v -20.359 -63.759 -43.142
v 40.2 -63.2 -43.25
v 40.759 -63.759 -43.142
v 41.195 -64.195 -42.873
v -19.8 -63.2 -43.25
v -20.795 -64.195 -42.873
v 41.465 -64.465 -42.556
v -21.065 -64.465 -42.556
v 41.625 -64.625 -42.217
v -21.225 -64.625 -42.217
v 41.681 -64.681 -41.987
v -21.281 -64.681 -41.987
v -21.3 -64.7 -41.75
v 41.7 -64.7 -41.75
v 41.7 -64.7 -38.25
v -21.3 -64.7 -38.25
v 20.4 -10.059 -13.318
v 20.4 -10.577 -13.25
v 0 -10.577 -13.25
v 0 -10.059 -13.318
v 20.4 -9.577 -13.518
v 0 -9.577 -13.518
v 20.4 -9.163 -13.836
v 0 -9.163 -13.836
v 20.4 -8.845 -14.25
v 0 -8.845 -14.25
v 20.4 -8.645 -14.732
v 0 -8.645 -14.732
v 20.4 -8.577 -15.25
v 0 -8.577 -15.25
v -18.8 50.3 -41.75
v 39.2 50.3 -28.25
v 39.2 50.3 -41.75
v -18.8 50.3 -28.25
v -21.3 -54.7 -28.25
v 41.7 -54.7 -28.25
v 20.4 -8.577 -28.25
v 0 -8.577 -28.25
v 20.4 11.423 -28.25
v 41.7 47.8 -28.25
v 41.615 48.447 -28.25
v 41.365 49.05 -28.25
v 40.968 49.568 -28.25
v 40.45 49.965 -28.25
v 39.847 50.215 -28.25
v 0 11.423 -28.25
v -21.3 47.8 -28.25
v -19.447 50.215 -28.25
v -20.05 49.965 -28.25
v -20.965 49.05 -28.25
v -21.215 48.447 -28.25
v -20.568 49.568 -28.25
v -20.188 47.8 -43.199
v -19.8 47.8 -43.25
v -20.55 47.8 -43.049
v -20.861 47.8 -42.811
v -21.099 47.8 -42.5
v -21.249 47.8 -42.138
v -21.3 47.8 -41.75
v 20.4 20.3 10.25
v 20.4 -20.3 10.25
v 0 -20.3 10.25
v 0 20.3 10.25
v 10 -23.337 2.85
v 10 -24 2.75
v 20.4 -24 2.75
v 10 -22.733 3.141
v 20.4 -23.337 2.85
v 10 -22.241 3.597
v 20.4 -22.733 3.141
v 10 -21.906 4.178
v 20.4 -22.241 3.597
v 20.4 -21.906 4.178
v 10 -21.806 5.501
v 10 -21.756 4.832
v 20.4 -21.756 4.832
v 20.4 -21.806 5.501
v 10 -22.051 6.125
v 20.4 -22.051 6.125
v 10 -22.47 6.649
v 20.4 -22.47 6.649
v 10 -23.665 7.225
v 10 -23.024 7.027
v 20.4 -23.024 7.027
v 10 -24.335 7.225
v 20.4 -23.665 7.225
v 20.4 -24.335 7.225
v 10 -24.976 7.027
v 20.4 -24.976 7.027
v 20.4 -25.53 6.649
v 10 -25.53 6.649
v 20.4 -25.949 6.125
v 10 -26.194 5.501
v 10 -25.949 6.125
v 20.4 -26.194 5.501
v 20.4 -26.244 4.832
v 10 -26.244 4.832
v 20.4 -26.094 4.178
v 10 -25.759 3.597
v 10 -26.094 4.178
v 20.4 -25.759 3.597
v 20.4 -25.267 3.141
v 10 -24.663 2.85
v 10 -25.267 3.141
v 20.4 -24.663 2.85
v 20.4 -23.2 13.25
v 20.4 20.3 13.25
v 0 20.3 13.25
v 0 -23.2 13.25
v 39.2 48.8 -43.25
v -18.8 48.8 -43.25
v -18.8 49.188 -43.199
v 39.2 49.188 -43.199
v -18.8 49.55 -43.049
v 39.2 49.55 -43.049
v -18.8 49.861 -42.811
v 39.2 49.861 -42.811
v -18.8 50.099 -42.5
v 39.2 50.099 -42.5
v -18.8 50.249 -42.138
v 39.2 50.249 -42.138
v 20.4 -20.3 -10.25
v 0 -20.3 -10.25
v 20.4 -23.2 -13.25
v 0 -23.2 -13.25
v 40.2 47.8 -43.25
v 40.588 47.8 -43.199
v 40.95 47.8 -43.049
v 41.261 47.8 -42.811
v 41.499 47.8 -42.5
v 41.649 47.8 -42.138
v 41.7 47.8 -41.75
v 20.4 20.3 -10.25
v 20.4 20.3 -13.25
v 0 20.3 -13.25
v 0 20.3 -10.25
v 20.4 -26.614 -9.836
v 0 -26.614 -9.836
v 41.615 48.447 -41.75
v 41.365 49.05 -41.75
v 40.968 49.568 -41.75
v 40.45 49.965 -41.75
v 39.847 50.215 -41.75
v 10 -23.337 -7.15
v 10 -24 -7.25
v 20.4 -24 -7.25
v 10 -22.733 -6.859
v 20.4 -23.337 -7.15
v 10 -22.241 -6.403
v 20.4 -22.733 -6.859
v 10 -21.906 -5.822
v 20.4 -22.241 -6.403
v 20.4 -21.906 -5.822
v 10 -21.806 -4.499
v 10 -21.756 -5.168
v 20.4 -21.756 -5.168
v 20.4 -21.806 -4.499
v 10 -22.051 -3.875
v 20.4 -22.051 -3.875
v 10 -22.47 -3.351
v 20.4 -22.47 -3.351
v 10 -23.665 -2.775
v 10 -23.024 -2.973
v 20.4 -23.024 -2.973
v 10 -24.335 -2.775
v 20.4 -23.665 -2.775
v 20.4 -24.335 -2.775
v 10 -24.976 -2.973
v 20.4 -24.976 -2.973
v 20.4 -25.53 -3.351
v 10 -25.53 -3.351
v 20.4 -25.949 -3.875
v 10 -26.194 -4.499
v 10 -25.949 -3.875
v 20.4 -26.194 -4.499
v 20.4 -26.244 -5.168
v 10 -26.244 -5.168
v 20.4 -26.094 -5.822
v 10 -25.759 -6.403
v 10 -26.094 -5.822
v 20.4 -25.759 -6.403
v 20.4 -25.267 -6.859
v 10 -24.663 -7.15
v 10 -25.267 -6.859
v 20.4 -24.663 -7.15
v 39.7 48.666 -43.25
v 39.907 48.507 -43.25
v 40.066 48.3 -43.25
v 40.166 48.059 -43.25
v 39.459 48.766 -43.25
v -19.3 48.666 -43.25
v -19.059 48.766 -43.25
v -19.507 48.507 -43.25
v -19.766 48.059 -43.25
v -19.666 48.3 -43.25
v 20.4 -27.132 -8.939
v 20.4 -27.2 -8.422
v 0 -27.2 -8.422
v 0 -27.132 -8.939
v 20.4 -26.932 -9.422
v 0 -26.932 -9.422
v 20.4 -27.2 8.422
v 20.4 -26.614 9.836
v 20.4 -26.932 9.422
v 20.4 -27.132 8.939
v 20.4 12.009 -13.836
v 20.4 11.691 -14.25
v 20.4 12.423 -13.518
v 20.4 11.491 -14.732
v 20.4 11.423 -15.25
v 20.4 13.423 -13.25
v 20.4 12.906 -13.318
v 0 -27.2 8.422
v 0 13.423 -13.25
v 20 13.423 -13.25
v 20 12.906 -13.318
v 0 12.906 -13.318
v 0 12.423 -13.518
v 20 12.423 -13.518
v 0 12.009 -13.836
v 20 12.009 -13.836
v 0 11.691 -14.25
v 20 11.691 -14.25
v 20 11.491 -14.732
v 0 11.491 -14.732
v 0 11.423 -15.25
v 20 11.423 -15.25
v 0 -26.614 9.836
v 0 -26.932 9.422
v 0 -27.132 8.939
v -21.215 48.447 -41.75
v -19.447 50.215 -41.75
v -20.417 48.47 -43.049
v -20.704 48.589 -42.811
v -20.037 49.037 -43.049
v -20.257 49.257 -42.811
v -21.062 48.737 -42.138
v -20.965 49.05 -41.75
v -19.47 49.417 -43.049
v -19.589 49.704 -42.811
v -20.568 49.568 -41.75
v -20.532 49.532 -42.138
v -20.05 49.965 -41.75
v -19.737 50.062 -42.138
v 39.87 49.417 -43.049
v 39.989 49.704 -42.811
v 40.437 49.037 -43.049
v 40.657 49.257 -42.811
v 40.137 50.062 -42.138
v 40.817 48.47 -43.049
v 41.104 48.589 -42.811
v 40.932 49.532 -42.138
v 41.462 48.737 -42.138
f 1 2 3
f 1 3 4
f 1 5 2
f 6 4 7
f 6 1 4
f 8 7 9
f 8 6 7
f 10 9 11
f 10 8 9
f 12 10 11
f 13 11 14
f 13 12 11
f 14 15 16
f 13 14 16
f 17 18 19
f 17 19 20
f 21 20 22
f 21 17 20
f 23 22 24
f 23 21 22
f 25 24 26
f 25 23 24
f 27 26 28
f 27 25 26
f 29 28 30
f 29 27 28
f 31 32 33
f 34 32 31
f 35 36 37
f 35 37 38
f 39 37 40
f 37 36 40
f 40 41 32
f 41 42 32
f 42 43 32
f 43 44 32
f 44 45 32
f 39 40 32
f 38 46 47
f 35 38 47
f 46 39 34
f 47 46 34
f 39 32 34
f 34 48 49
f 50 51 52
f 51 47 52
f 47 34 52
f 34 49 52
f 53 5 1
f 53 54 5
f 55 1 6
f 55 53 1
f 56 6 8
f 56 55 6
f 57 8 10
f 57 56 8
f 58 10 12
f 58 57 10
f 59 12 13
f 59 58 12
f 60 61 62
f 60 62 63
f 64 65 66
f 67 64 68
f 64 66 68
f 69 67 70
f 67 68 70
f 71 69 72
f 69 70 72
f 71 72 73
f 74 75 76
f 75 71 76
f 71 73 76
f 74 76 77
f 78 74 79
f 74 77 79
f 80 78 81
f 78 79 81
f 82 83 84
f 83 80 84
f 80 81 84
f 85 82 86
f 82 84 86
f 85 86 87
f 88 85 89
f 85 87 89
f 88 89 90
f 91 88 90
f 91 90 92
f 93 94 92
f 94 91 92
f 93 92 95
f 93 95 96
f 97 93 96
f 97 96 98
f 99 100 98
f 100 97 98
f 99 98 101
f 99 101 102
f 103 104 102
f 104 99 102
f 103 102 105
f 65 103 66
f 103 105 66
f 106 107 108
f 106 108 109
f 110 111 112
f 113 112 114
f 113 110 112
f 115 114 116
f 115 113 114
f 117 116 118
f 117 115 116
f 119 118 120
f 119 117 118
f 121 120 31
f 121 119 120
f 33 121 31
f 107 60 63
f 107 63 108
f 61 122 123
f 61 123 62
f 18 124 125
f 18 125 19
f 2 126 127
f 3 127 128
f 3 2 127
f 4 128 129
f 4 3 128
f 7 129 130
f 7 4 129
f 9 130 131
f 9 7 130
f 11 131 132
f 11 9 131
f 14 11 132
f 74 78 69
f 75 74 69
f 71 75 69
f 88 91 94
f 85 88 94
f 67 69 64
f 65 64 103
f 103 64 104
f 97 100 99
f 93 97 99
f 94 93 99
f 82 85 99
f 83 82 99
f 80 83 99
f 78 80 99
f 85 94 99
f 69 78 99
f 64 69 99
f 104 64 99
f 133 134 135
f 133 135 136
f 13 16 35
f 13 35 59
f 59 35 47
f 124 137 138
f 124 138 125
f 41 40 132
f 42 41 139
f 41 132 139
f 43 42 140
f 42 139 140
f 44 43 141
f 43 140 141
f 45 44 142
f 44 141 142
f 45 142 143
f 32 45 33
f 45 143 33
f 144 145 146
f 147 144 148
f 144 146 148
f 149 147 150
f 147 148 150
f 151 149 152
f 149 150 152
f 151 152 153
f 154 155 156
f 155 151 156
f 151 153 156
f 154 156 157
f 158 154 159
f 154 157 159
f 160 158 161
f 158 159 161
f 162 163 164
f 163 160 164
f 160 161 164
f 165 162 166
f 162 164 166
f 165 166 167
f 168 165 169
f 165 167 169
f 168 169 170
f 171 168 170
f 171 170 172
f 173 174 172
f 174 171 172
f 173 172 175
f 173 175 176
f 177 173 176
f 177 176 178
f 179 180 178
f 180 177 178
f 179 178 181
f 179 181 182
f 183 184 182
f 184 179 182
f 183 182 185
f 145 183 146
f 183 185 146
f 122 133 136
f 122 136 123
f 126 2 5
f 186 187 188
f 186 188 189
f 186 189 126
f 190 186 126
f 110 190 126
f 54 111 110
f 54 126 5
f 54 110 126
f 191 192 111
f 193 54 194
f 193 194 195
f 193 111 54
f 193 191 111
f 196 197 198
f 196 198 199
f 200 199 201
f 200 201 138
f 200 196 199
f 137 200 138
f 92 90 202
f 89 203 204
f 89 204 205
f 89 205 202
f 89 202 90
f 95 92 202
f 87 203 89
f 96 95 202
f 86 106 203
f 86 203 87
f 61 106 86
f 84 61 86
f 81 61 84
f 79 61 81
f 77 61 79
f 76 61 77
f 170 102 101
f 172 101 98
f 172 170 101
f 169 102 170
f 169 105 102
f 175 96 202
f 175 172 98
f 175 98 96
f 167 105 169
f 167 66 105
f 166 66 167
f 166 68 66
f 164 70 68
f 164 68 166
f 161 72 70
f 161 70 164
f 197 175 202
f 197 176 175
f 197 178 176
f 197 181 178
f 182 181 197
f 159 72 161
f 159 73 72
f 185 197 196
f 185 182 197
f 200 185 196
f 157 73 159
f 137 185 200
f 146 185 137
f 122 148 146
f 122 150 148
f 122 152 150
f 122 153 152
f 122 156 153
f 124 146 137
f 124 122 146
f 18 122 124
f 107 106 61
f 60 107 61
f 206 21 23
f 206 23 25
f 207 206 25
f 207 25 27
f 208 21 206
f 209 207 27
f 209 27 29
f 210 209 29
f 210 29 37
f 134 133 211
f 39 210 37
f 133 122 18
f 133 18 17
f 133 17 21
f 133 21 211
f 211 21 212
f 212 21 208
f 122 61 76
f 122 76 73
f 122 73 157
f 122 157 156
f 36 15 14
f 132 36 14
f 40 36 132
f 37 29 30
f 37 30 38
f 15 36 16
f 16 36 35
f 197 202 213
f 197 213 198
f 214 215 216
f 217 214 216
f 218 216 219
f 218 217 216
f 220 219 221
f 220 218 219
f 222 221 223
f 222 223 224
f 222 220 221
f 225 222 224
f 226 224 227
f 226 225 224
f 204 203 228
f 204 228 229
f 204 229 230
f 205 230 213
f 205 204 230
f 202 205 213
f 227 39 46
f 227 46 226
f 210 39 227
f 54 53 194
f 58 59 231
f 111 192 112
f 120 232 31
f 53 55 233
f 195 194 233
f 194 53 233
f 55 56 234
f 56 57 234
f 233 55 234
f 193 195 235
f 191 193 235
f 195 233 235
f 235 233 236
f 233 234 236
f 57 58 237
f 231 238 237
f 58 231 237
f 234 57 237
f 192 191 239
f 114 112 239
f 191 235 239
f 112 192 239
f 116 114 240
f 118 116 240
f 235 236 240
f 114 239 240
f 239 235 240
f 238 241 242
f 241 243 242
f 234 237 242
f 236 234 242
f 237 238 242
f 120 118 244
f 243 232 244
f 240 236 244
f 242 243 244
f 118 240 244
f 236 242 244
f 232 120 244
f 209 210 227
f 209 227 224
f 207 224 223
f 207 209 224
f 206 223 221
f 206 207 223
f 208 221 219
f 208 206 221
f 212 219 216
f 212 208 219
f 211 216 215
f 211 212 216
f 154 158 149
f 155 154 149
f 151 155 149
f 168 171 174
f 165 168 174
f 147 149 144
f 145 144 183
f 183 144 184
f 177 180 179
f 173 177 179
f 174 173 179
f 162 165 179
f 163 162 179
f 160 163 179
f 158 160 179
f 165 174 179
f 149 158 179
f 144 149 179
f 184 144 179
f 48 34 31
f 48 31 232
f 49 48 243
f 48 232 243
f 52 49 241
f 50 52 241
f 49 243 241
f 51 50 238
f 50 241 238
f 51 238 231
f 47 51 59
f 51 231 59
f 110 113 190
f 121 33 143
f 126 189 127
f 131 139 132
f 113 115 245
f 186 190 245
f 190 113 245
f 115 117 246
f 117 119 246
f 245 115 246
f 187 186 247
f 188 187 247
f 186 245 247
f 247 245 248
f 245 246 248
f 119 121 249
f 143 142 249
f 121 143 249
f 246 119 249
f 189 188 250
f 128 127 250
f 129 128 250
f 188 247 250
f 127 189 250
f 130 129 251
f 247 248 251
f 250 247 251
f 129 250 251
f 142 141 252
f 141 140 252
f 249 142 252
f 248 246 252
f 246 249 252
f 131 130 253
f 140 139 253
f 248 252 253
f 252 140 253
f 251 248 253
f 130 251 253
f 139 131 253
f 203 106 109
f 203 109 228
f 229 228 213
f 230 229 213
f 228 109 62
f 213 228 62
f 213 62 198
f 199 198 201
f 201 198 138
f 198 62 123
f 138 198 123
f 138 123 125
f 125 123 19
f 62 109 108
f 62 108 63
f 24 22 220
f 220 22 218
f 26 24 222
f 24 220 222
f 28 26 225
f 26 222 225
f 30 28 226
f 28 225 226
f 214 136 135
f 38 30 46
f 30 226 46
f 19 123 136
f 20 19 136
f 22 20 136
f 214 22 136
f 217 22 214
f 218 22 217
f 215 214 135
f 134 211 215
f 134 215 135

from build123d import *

# Parameters (mm, degrees)
SKETCH1_R            = 2.25
BOSS_EXTRUDE1_DEPTH  = 20
SKETCH2_R            = 2.25
BOSS_EXTRUDE2_DEPTH  = 10
SKETCH4_W            = 26.5
SKETCH4_H            = 2.5
CUT_EXTRUDE1_DEPTH   = 39.17921555
CHAMFER2_SIZE        = 4
CHAMFER3_SIZE        = 4
FILLET4_R            = 2
SKETCH7_W            = 15
SKETCH7_H            = 20
BOSS_EXTRUDE5_DEPTH  = 20
FILLET6_R            = 2
SKETCH13_R           = 2.25
BOSS_EXTRUDE8_DEPTH  = 20
CUT_EXTRUDE2_DEPTH   = 45.021614009
BOSS_EXTRUDE9_START  = -10
SKETCH14_R           = 2.25
BOSS_EXTRUDE9_DEPTH  = 10
BOSS_EXTRUDE10_START = 0.4
SKETCH15_R           = 2.25
BOSS_EXTRUDE10_DEPTH = 0.4
SKETCH16_W           = 63
SKETCH16_H           = 115
BOSS_EXTRUDE11_DEPTH = 15
CHAMFER4_SIZE        = 10
FILLET7_R            = 2.5
FILLET8_R            = 1.5


with BuildPart() as part:
    # Sketch1 → Boss-Extrude1 (new body)
    with BuildSketch(Plane(origin=(0, 0, 0), x_dir=(0, 0, -1), z_dir=(1, 0, 0))):
        Polygon((10.25, -20.3), (13.25, -20.3), (13.25, 29.7), (-13.25, 29.7), (-13.25, -20.3), (-10.25, -20.3), (-10.25, 20.3), (10.25, 20.3), align=None)
        with Locations((5, 24)):
            Circle(SKETCH1_R, mode=Mode.SUBTRACT)
        with Locations((-5, 24)):
            Circle(SKETCH1_R, mode=Mode.SUBTRACT)
    extrude(amount=BOSS_EXTRUDE1_DEPTH)

    # Sketch2 → Boss-Extrude2 (add)
    with BuildSketch(Plane.ZY):
        with Locations((-5, 24)):
            Circle(SKETCH2_R)
        with Locations((5, 24)):
            Circle(SKETCH2_R)
    extrude(amount=-BOSS_EXTRUDE2_DEPTH)

    # Sketch4 → Cut-Extrude1 (cut, through all)
    with BuildSketch(Plane(origin=(20, 0, 0), x_dir=(0, 0, -1), z_dir=(1, 0, 0))):
        with Locations((0, 28.45)):
            Rectangle(SKETCH4_W, SKETCH4_H)
    extrude(amount=-CUT_EXTRUDE1_DEPTH, mode=Mode.SUBTRACT)

    # Chamfer2
    chamfer2_edges = [part.edges().sort_by_distance(p)[0] for p in [
        (10, 27.2, -13.25),
    ]]
    chamfer(chamfer2_edges, length=CHAMFER2_SIZE)

    # Chamfer3
    chamfer3_edges = [part.edges().sort_by_distance(p)[0] for p in [
        (10, 27.2, 13.25),
    ]]
    chamfer(chamfer3_edges, length=CHAMFER3_SIZE)

    # Fillet4
    fillet4_edges = [part.edges().sort_by_distance(p)[0] for p in [
        (10, 27.2, -9.25),
        (10, 27.2, 9.25),
    ]]
    fillet(fillet4_edges, radius=FILLET4_R)

    # Sketch7 → Boss-Extrude5 (add)
    with BuildSketch(Plane(origin=(20, 0, 0), x_dir=(0, 0, -1), z_dir=(1, 0, 0))):
        with Locations((20.75, 1.423218073)):
            Rectangle(SKETCH7_W, SKETCH7_H)
    extrude(amount=-BOSS_EXTRUDE5_DEPTH)

    # Fillet6
    fillet6_edges = [part.edges().sort_by_distance(p)[0] for p in [
        (10, -8.576781927, -13.25),
        (10, 11.423218073, -13.25),
    ]]
    fillet(fillet6_edges, radius=FILLET6_R)

    # Sketch13 → Boss-Extrude8 (add)
    with BuildSketch(Plane(origin=(20, 0, 0), x_dir=(0, 0, -1), z_dir=(1, 0, 0))):
        with BuildLine():
            Line((-13.25, -23.2), (-9.835786438, -26.614213562))
            ThreePointArc((-9.835786438, -26.614213562), (-9.18693974, -27.047759065), (-8.421572875, -27.2))
            Line((-8.421572875, -27.2), (8.421572875, -27.2))
            ThreePointArc((8.421572875, -27.2), (9.18693974, -27.047759065), (9.835786438, -26.614213562))
            Line((9.835786438, -26.614213562), (13.25, -23.2))
            Line((13.25, -23.2), (13.25, -20.3))
            Line((13.25, -20.3), (-13.25, -20.3))
            Line((-13.25, -20.3), (-13.25, -23.2))
        make_face()
        with Locations((5, -24)):
            Circle(SKETCH13_R, mode=Mode.SUBTRACT)
        with Locations((-5, -24)):
            Circle(SKETCH13_R, mode=Mode.SUBTRACT)
    extrude(amount=-BOSS_EXTRUDE8_DEPTH)

    # Sketch12 → Cut-Extrude2 (cut, through all)
    with BuildSketch(Plane(origin=(20, 0, 0), x_dir=(0, 0, -1), z_dir=(1, 0, 0))):
        with BuildLine():
            Line((13.25, 23.2), (9.835786438, 26.614213562))
            ThreePointArc((9.835786438, 26.614213562), (9.18693974, 27.047759065), (8.421572875, 27.2))
            Line((8.421572875, 27.2), (-8.421572875, 27.2))
            ThreePointArc((-8.421572875, 27.2), (-9.18693974, 27.047759065), (-9.835786438, 26.614213562))
            Line((-9.835786438, 26.614213562), (-13.25, 23.2))
            Line((-13.25, 23.2), (-13.25, 20.3))
            Line((-13.25, 20.3), (13.25, 20.3))
            Line((13.25, 20.3), (13.25, 23.2))
        make_face()
    extrude(amount=-CUT_EXTRUDE2_DEPTH, mode=Mode.SUBTRACT)

    # Sketch14 → Boss-Extrude9 (add)
    with BuildSketch(Plane.ZY.offset(BOSS_EXTRUDE9_START)):
        with Locations(Location((-5, -24, 0), (0, 0, 180))):
            Circle(SKETCH14_R)
        with Locations(Location((5, -24, 0), (0, 0, 180))):
            Circle(SKETCH14_R)
    extrude(amount=BOSS_EXTRUDE9_DEPTH)

    # Sketch15 → Boss-Extrude10 (add)
    with BuildSketch(Plane(origin=(20, 0, 0), x_dir=(0, 0, -1), z_dir=(1, 0, 0)).offset(BOSS_EXTRUDE10_START)):
        with BuildLine():
            Line((-10.25, 20.3), (-13.25, 20.3))
            Line((-13.25, 20.3), (-13.25, -23.2))
            Line((-13.25, -23.2), (-9.835786438, -26.614213562))
            ThreePointArc((-9.835786438, -26.614213562), (-9.18693974, -27.047759065), (-8.421572875, -27.2))
            Line((-8.421572875, -27.2), (8.421572875, -27.2))
            ThreePointArc((8.421572875, -27.2), (9.18693974, -27.047759065), (9.835786438, -26.614213562))
            Line((9.835786438, -26.614213562), (13.25, -23.2))
            Line((13.25, -23.2), (13.25, -10.576781927))
            ThreePointArc((13.25, -10.576781927), (13.835786438, -9.162568365), (15.25, -8.576781927))
            Line((15.25, -8.576781927), (28.25, -8.576781927))
            Line((28.25, -8.576781927), (28.25, 11.423218073))
            Line((28.25, 11.423218073), (15.25, 11.423218073))
            ThreePointArc((15.25, 11.423218073), (13.835786438, 12.00900451), (13.25, 13.423218073))
            Line((13.25, 13.423218073), (13.25, 20.3))
            Line((13.25, 20.3), (10.25, 20.3))
            Line((10.25, 20.3), (10.25, -20.3))
            Line((10.25, -20.3), (-10.25, -20.3))
            Line((-10.25, -20.3), (-10.25, 20.3))
        make_face()
        with Locations((5, -24)):
            Circle(SKETCH15_R, mode=Mode.SUBTRACT)
        with Locations((-5, -24)):
            Circle(SKETCH15_R, mode=Mode.SUBTRACT)
    extrude(amount=-BOSS_EXTRUDE10_DEPTH)

    # Sketch16 → Boss-Extrude11 (add)
    with BuildSketch(Plane(origin=(0, 0, -28.25), x_dir=(-1, 0, 0), z_dir=(0, 0, -1))):
        with Locations((-10.2, -7.2)):
            Rectangle(SKETCH16_W, SKETCH16_H)
    extrude(amount=BOSS_EXTRUDE11_DEPTH)

    # Chamfer4
    chamfer4_edges = [part.edges().sort_by_distance(p)[0] for p in [
        (10.2, -64.7, -28.25),
    ]]
    chamfer(chamfer4_edges, length=CHAMFER4_SIZE)

    # Fillet7
    fillet7_edges = [part.edges().sort_by_distance(p)[0] for p in [
        (41.7, 50.3, -35.75),
        (-21.3, 50.3, -35.75),
    ]]
    fillet(fillet7_edges, radius=FILLET7_R)

    # Fillet8
    fillet8_edges = [part.edges().sort_by_distance(p)[0] for p in [
        (10.2, -64.7, -43.25),
        (-21.3, -8.45, -43.25),
        (10.2, 50.3, -43.25),
        (41.7, -8.45, -43.25),
        (40.967766953, 49.567766953, -43.25),
        (-20.567766953, 49.567766953, -43.25),
    ]]
    fillet(fillet8_edges, radius=FILLET8_R)


solid = part.part
